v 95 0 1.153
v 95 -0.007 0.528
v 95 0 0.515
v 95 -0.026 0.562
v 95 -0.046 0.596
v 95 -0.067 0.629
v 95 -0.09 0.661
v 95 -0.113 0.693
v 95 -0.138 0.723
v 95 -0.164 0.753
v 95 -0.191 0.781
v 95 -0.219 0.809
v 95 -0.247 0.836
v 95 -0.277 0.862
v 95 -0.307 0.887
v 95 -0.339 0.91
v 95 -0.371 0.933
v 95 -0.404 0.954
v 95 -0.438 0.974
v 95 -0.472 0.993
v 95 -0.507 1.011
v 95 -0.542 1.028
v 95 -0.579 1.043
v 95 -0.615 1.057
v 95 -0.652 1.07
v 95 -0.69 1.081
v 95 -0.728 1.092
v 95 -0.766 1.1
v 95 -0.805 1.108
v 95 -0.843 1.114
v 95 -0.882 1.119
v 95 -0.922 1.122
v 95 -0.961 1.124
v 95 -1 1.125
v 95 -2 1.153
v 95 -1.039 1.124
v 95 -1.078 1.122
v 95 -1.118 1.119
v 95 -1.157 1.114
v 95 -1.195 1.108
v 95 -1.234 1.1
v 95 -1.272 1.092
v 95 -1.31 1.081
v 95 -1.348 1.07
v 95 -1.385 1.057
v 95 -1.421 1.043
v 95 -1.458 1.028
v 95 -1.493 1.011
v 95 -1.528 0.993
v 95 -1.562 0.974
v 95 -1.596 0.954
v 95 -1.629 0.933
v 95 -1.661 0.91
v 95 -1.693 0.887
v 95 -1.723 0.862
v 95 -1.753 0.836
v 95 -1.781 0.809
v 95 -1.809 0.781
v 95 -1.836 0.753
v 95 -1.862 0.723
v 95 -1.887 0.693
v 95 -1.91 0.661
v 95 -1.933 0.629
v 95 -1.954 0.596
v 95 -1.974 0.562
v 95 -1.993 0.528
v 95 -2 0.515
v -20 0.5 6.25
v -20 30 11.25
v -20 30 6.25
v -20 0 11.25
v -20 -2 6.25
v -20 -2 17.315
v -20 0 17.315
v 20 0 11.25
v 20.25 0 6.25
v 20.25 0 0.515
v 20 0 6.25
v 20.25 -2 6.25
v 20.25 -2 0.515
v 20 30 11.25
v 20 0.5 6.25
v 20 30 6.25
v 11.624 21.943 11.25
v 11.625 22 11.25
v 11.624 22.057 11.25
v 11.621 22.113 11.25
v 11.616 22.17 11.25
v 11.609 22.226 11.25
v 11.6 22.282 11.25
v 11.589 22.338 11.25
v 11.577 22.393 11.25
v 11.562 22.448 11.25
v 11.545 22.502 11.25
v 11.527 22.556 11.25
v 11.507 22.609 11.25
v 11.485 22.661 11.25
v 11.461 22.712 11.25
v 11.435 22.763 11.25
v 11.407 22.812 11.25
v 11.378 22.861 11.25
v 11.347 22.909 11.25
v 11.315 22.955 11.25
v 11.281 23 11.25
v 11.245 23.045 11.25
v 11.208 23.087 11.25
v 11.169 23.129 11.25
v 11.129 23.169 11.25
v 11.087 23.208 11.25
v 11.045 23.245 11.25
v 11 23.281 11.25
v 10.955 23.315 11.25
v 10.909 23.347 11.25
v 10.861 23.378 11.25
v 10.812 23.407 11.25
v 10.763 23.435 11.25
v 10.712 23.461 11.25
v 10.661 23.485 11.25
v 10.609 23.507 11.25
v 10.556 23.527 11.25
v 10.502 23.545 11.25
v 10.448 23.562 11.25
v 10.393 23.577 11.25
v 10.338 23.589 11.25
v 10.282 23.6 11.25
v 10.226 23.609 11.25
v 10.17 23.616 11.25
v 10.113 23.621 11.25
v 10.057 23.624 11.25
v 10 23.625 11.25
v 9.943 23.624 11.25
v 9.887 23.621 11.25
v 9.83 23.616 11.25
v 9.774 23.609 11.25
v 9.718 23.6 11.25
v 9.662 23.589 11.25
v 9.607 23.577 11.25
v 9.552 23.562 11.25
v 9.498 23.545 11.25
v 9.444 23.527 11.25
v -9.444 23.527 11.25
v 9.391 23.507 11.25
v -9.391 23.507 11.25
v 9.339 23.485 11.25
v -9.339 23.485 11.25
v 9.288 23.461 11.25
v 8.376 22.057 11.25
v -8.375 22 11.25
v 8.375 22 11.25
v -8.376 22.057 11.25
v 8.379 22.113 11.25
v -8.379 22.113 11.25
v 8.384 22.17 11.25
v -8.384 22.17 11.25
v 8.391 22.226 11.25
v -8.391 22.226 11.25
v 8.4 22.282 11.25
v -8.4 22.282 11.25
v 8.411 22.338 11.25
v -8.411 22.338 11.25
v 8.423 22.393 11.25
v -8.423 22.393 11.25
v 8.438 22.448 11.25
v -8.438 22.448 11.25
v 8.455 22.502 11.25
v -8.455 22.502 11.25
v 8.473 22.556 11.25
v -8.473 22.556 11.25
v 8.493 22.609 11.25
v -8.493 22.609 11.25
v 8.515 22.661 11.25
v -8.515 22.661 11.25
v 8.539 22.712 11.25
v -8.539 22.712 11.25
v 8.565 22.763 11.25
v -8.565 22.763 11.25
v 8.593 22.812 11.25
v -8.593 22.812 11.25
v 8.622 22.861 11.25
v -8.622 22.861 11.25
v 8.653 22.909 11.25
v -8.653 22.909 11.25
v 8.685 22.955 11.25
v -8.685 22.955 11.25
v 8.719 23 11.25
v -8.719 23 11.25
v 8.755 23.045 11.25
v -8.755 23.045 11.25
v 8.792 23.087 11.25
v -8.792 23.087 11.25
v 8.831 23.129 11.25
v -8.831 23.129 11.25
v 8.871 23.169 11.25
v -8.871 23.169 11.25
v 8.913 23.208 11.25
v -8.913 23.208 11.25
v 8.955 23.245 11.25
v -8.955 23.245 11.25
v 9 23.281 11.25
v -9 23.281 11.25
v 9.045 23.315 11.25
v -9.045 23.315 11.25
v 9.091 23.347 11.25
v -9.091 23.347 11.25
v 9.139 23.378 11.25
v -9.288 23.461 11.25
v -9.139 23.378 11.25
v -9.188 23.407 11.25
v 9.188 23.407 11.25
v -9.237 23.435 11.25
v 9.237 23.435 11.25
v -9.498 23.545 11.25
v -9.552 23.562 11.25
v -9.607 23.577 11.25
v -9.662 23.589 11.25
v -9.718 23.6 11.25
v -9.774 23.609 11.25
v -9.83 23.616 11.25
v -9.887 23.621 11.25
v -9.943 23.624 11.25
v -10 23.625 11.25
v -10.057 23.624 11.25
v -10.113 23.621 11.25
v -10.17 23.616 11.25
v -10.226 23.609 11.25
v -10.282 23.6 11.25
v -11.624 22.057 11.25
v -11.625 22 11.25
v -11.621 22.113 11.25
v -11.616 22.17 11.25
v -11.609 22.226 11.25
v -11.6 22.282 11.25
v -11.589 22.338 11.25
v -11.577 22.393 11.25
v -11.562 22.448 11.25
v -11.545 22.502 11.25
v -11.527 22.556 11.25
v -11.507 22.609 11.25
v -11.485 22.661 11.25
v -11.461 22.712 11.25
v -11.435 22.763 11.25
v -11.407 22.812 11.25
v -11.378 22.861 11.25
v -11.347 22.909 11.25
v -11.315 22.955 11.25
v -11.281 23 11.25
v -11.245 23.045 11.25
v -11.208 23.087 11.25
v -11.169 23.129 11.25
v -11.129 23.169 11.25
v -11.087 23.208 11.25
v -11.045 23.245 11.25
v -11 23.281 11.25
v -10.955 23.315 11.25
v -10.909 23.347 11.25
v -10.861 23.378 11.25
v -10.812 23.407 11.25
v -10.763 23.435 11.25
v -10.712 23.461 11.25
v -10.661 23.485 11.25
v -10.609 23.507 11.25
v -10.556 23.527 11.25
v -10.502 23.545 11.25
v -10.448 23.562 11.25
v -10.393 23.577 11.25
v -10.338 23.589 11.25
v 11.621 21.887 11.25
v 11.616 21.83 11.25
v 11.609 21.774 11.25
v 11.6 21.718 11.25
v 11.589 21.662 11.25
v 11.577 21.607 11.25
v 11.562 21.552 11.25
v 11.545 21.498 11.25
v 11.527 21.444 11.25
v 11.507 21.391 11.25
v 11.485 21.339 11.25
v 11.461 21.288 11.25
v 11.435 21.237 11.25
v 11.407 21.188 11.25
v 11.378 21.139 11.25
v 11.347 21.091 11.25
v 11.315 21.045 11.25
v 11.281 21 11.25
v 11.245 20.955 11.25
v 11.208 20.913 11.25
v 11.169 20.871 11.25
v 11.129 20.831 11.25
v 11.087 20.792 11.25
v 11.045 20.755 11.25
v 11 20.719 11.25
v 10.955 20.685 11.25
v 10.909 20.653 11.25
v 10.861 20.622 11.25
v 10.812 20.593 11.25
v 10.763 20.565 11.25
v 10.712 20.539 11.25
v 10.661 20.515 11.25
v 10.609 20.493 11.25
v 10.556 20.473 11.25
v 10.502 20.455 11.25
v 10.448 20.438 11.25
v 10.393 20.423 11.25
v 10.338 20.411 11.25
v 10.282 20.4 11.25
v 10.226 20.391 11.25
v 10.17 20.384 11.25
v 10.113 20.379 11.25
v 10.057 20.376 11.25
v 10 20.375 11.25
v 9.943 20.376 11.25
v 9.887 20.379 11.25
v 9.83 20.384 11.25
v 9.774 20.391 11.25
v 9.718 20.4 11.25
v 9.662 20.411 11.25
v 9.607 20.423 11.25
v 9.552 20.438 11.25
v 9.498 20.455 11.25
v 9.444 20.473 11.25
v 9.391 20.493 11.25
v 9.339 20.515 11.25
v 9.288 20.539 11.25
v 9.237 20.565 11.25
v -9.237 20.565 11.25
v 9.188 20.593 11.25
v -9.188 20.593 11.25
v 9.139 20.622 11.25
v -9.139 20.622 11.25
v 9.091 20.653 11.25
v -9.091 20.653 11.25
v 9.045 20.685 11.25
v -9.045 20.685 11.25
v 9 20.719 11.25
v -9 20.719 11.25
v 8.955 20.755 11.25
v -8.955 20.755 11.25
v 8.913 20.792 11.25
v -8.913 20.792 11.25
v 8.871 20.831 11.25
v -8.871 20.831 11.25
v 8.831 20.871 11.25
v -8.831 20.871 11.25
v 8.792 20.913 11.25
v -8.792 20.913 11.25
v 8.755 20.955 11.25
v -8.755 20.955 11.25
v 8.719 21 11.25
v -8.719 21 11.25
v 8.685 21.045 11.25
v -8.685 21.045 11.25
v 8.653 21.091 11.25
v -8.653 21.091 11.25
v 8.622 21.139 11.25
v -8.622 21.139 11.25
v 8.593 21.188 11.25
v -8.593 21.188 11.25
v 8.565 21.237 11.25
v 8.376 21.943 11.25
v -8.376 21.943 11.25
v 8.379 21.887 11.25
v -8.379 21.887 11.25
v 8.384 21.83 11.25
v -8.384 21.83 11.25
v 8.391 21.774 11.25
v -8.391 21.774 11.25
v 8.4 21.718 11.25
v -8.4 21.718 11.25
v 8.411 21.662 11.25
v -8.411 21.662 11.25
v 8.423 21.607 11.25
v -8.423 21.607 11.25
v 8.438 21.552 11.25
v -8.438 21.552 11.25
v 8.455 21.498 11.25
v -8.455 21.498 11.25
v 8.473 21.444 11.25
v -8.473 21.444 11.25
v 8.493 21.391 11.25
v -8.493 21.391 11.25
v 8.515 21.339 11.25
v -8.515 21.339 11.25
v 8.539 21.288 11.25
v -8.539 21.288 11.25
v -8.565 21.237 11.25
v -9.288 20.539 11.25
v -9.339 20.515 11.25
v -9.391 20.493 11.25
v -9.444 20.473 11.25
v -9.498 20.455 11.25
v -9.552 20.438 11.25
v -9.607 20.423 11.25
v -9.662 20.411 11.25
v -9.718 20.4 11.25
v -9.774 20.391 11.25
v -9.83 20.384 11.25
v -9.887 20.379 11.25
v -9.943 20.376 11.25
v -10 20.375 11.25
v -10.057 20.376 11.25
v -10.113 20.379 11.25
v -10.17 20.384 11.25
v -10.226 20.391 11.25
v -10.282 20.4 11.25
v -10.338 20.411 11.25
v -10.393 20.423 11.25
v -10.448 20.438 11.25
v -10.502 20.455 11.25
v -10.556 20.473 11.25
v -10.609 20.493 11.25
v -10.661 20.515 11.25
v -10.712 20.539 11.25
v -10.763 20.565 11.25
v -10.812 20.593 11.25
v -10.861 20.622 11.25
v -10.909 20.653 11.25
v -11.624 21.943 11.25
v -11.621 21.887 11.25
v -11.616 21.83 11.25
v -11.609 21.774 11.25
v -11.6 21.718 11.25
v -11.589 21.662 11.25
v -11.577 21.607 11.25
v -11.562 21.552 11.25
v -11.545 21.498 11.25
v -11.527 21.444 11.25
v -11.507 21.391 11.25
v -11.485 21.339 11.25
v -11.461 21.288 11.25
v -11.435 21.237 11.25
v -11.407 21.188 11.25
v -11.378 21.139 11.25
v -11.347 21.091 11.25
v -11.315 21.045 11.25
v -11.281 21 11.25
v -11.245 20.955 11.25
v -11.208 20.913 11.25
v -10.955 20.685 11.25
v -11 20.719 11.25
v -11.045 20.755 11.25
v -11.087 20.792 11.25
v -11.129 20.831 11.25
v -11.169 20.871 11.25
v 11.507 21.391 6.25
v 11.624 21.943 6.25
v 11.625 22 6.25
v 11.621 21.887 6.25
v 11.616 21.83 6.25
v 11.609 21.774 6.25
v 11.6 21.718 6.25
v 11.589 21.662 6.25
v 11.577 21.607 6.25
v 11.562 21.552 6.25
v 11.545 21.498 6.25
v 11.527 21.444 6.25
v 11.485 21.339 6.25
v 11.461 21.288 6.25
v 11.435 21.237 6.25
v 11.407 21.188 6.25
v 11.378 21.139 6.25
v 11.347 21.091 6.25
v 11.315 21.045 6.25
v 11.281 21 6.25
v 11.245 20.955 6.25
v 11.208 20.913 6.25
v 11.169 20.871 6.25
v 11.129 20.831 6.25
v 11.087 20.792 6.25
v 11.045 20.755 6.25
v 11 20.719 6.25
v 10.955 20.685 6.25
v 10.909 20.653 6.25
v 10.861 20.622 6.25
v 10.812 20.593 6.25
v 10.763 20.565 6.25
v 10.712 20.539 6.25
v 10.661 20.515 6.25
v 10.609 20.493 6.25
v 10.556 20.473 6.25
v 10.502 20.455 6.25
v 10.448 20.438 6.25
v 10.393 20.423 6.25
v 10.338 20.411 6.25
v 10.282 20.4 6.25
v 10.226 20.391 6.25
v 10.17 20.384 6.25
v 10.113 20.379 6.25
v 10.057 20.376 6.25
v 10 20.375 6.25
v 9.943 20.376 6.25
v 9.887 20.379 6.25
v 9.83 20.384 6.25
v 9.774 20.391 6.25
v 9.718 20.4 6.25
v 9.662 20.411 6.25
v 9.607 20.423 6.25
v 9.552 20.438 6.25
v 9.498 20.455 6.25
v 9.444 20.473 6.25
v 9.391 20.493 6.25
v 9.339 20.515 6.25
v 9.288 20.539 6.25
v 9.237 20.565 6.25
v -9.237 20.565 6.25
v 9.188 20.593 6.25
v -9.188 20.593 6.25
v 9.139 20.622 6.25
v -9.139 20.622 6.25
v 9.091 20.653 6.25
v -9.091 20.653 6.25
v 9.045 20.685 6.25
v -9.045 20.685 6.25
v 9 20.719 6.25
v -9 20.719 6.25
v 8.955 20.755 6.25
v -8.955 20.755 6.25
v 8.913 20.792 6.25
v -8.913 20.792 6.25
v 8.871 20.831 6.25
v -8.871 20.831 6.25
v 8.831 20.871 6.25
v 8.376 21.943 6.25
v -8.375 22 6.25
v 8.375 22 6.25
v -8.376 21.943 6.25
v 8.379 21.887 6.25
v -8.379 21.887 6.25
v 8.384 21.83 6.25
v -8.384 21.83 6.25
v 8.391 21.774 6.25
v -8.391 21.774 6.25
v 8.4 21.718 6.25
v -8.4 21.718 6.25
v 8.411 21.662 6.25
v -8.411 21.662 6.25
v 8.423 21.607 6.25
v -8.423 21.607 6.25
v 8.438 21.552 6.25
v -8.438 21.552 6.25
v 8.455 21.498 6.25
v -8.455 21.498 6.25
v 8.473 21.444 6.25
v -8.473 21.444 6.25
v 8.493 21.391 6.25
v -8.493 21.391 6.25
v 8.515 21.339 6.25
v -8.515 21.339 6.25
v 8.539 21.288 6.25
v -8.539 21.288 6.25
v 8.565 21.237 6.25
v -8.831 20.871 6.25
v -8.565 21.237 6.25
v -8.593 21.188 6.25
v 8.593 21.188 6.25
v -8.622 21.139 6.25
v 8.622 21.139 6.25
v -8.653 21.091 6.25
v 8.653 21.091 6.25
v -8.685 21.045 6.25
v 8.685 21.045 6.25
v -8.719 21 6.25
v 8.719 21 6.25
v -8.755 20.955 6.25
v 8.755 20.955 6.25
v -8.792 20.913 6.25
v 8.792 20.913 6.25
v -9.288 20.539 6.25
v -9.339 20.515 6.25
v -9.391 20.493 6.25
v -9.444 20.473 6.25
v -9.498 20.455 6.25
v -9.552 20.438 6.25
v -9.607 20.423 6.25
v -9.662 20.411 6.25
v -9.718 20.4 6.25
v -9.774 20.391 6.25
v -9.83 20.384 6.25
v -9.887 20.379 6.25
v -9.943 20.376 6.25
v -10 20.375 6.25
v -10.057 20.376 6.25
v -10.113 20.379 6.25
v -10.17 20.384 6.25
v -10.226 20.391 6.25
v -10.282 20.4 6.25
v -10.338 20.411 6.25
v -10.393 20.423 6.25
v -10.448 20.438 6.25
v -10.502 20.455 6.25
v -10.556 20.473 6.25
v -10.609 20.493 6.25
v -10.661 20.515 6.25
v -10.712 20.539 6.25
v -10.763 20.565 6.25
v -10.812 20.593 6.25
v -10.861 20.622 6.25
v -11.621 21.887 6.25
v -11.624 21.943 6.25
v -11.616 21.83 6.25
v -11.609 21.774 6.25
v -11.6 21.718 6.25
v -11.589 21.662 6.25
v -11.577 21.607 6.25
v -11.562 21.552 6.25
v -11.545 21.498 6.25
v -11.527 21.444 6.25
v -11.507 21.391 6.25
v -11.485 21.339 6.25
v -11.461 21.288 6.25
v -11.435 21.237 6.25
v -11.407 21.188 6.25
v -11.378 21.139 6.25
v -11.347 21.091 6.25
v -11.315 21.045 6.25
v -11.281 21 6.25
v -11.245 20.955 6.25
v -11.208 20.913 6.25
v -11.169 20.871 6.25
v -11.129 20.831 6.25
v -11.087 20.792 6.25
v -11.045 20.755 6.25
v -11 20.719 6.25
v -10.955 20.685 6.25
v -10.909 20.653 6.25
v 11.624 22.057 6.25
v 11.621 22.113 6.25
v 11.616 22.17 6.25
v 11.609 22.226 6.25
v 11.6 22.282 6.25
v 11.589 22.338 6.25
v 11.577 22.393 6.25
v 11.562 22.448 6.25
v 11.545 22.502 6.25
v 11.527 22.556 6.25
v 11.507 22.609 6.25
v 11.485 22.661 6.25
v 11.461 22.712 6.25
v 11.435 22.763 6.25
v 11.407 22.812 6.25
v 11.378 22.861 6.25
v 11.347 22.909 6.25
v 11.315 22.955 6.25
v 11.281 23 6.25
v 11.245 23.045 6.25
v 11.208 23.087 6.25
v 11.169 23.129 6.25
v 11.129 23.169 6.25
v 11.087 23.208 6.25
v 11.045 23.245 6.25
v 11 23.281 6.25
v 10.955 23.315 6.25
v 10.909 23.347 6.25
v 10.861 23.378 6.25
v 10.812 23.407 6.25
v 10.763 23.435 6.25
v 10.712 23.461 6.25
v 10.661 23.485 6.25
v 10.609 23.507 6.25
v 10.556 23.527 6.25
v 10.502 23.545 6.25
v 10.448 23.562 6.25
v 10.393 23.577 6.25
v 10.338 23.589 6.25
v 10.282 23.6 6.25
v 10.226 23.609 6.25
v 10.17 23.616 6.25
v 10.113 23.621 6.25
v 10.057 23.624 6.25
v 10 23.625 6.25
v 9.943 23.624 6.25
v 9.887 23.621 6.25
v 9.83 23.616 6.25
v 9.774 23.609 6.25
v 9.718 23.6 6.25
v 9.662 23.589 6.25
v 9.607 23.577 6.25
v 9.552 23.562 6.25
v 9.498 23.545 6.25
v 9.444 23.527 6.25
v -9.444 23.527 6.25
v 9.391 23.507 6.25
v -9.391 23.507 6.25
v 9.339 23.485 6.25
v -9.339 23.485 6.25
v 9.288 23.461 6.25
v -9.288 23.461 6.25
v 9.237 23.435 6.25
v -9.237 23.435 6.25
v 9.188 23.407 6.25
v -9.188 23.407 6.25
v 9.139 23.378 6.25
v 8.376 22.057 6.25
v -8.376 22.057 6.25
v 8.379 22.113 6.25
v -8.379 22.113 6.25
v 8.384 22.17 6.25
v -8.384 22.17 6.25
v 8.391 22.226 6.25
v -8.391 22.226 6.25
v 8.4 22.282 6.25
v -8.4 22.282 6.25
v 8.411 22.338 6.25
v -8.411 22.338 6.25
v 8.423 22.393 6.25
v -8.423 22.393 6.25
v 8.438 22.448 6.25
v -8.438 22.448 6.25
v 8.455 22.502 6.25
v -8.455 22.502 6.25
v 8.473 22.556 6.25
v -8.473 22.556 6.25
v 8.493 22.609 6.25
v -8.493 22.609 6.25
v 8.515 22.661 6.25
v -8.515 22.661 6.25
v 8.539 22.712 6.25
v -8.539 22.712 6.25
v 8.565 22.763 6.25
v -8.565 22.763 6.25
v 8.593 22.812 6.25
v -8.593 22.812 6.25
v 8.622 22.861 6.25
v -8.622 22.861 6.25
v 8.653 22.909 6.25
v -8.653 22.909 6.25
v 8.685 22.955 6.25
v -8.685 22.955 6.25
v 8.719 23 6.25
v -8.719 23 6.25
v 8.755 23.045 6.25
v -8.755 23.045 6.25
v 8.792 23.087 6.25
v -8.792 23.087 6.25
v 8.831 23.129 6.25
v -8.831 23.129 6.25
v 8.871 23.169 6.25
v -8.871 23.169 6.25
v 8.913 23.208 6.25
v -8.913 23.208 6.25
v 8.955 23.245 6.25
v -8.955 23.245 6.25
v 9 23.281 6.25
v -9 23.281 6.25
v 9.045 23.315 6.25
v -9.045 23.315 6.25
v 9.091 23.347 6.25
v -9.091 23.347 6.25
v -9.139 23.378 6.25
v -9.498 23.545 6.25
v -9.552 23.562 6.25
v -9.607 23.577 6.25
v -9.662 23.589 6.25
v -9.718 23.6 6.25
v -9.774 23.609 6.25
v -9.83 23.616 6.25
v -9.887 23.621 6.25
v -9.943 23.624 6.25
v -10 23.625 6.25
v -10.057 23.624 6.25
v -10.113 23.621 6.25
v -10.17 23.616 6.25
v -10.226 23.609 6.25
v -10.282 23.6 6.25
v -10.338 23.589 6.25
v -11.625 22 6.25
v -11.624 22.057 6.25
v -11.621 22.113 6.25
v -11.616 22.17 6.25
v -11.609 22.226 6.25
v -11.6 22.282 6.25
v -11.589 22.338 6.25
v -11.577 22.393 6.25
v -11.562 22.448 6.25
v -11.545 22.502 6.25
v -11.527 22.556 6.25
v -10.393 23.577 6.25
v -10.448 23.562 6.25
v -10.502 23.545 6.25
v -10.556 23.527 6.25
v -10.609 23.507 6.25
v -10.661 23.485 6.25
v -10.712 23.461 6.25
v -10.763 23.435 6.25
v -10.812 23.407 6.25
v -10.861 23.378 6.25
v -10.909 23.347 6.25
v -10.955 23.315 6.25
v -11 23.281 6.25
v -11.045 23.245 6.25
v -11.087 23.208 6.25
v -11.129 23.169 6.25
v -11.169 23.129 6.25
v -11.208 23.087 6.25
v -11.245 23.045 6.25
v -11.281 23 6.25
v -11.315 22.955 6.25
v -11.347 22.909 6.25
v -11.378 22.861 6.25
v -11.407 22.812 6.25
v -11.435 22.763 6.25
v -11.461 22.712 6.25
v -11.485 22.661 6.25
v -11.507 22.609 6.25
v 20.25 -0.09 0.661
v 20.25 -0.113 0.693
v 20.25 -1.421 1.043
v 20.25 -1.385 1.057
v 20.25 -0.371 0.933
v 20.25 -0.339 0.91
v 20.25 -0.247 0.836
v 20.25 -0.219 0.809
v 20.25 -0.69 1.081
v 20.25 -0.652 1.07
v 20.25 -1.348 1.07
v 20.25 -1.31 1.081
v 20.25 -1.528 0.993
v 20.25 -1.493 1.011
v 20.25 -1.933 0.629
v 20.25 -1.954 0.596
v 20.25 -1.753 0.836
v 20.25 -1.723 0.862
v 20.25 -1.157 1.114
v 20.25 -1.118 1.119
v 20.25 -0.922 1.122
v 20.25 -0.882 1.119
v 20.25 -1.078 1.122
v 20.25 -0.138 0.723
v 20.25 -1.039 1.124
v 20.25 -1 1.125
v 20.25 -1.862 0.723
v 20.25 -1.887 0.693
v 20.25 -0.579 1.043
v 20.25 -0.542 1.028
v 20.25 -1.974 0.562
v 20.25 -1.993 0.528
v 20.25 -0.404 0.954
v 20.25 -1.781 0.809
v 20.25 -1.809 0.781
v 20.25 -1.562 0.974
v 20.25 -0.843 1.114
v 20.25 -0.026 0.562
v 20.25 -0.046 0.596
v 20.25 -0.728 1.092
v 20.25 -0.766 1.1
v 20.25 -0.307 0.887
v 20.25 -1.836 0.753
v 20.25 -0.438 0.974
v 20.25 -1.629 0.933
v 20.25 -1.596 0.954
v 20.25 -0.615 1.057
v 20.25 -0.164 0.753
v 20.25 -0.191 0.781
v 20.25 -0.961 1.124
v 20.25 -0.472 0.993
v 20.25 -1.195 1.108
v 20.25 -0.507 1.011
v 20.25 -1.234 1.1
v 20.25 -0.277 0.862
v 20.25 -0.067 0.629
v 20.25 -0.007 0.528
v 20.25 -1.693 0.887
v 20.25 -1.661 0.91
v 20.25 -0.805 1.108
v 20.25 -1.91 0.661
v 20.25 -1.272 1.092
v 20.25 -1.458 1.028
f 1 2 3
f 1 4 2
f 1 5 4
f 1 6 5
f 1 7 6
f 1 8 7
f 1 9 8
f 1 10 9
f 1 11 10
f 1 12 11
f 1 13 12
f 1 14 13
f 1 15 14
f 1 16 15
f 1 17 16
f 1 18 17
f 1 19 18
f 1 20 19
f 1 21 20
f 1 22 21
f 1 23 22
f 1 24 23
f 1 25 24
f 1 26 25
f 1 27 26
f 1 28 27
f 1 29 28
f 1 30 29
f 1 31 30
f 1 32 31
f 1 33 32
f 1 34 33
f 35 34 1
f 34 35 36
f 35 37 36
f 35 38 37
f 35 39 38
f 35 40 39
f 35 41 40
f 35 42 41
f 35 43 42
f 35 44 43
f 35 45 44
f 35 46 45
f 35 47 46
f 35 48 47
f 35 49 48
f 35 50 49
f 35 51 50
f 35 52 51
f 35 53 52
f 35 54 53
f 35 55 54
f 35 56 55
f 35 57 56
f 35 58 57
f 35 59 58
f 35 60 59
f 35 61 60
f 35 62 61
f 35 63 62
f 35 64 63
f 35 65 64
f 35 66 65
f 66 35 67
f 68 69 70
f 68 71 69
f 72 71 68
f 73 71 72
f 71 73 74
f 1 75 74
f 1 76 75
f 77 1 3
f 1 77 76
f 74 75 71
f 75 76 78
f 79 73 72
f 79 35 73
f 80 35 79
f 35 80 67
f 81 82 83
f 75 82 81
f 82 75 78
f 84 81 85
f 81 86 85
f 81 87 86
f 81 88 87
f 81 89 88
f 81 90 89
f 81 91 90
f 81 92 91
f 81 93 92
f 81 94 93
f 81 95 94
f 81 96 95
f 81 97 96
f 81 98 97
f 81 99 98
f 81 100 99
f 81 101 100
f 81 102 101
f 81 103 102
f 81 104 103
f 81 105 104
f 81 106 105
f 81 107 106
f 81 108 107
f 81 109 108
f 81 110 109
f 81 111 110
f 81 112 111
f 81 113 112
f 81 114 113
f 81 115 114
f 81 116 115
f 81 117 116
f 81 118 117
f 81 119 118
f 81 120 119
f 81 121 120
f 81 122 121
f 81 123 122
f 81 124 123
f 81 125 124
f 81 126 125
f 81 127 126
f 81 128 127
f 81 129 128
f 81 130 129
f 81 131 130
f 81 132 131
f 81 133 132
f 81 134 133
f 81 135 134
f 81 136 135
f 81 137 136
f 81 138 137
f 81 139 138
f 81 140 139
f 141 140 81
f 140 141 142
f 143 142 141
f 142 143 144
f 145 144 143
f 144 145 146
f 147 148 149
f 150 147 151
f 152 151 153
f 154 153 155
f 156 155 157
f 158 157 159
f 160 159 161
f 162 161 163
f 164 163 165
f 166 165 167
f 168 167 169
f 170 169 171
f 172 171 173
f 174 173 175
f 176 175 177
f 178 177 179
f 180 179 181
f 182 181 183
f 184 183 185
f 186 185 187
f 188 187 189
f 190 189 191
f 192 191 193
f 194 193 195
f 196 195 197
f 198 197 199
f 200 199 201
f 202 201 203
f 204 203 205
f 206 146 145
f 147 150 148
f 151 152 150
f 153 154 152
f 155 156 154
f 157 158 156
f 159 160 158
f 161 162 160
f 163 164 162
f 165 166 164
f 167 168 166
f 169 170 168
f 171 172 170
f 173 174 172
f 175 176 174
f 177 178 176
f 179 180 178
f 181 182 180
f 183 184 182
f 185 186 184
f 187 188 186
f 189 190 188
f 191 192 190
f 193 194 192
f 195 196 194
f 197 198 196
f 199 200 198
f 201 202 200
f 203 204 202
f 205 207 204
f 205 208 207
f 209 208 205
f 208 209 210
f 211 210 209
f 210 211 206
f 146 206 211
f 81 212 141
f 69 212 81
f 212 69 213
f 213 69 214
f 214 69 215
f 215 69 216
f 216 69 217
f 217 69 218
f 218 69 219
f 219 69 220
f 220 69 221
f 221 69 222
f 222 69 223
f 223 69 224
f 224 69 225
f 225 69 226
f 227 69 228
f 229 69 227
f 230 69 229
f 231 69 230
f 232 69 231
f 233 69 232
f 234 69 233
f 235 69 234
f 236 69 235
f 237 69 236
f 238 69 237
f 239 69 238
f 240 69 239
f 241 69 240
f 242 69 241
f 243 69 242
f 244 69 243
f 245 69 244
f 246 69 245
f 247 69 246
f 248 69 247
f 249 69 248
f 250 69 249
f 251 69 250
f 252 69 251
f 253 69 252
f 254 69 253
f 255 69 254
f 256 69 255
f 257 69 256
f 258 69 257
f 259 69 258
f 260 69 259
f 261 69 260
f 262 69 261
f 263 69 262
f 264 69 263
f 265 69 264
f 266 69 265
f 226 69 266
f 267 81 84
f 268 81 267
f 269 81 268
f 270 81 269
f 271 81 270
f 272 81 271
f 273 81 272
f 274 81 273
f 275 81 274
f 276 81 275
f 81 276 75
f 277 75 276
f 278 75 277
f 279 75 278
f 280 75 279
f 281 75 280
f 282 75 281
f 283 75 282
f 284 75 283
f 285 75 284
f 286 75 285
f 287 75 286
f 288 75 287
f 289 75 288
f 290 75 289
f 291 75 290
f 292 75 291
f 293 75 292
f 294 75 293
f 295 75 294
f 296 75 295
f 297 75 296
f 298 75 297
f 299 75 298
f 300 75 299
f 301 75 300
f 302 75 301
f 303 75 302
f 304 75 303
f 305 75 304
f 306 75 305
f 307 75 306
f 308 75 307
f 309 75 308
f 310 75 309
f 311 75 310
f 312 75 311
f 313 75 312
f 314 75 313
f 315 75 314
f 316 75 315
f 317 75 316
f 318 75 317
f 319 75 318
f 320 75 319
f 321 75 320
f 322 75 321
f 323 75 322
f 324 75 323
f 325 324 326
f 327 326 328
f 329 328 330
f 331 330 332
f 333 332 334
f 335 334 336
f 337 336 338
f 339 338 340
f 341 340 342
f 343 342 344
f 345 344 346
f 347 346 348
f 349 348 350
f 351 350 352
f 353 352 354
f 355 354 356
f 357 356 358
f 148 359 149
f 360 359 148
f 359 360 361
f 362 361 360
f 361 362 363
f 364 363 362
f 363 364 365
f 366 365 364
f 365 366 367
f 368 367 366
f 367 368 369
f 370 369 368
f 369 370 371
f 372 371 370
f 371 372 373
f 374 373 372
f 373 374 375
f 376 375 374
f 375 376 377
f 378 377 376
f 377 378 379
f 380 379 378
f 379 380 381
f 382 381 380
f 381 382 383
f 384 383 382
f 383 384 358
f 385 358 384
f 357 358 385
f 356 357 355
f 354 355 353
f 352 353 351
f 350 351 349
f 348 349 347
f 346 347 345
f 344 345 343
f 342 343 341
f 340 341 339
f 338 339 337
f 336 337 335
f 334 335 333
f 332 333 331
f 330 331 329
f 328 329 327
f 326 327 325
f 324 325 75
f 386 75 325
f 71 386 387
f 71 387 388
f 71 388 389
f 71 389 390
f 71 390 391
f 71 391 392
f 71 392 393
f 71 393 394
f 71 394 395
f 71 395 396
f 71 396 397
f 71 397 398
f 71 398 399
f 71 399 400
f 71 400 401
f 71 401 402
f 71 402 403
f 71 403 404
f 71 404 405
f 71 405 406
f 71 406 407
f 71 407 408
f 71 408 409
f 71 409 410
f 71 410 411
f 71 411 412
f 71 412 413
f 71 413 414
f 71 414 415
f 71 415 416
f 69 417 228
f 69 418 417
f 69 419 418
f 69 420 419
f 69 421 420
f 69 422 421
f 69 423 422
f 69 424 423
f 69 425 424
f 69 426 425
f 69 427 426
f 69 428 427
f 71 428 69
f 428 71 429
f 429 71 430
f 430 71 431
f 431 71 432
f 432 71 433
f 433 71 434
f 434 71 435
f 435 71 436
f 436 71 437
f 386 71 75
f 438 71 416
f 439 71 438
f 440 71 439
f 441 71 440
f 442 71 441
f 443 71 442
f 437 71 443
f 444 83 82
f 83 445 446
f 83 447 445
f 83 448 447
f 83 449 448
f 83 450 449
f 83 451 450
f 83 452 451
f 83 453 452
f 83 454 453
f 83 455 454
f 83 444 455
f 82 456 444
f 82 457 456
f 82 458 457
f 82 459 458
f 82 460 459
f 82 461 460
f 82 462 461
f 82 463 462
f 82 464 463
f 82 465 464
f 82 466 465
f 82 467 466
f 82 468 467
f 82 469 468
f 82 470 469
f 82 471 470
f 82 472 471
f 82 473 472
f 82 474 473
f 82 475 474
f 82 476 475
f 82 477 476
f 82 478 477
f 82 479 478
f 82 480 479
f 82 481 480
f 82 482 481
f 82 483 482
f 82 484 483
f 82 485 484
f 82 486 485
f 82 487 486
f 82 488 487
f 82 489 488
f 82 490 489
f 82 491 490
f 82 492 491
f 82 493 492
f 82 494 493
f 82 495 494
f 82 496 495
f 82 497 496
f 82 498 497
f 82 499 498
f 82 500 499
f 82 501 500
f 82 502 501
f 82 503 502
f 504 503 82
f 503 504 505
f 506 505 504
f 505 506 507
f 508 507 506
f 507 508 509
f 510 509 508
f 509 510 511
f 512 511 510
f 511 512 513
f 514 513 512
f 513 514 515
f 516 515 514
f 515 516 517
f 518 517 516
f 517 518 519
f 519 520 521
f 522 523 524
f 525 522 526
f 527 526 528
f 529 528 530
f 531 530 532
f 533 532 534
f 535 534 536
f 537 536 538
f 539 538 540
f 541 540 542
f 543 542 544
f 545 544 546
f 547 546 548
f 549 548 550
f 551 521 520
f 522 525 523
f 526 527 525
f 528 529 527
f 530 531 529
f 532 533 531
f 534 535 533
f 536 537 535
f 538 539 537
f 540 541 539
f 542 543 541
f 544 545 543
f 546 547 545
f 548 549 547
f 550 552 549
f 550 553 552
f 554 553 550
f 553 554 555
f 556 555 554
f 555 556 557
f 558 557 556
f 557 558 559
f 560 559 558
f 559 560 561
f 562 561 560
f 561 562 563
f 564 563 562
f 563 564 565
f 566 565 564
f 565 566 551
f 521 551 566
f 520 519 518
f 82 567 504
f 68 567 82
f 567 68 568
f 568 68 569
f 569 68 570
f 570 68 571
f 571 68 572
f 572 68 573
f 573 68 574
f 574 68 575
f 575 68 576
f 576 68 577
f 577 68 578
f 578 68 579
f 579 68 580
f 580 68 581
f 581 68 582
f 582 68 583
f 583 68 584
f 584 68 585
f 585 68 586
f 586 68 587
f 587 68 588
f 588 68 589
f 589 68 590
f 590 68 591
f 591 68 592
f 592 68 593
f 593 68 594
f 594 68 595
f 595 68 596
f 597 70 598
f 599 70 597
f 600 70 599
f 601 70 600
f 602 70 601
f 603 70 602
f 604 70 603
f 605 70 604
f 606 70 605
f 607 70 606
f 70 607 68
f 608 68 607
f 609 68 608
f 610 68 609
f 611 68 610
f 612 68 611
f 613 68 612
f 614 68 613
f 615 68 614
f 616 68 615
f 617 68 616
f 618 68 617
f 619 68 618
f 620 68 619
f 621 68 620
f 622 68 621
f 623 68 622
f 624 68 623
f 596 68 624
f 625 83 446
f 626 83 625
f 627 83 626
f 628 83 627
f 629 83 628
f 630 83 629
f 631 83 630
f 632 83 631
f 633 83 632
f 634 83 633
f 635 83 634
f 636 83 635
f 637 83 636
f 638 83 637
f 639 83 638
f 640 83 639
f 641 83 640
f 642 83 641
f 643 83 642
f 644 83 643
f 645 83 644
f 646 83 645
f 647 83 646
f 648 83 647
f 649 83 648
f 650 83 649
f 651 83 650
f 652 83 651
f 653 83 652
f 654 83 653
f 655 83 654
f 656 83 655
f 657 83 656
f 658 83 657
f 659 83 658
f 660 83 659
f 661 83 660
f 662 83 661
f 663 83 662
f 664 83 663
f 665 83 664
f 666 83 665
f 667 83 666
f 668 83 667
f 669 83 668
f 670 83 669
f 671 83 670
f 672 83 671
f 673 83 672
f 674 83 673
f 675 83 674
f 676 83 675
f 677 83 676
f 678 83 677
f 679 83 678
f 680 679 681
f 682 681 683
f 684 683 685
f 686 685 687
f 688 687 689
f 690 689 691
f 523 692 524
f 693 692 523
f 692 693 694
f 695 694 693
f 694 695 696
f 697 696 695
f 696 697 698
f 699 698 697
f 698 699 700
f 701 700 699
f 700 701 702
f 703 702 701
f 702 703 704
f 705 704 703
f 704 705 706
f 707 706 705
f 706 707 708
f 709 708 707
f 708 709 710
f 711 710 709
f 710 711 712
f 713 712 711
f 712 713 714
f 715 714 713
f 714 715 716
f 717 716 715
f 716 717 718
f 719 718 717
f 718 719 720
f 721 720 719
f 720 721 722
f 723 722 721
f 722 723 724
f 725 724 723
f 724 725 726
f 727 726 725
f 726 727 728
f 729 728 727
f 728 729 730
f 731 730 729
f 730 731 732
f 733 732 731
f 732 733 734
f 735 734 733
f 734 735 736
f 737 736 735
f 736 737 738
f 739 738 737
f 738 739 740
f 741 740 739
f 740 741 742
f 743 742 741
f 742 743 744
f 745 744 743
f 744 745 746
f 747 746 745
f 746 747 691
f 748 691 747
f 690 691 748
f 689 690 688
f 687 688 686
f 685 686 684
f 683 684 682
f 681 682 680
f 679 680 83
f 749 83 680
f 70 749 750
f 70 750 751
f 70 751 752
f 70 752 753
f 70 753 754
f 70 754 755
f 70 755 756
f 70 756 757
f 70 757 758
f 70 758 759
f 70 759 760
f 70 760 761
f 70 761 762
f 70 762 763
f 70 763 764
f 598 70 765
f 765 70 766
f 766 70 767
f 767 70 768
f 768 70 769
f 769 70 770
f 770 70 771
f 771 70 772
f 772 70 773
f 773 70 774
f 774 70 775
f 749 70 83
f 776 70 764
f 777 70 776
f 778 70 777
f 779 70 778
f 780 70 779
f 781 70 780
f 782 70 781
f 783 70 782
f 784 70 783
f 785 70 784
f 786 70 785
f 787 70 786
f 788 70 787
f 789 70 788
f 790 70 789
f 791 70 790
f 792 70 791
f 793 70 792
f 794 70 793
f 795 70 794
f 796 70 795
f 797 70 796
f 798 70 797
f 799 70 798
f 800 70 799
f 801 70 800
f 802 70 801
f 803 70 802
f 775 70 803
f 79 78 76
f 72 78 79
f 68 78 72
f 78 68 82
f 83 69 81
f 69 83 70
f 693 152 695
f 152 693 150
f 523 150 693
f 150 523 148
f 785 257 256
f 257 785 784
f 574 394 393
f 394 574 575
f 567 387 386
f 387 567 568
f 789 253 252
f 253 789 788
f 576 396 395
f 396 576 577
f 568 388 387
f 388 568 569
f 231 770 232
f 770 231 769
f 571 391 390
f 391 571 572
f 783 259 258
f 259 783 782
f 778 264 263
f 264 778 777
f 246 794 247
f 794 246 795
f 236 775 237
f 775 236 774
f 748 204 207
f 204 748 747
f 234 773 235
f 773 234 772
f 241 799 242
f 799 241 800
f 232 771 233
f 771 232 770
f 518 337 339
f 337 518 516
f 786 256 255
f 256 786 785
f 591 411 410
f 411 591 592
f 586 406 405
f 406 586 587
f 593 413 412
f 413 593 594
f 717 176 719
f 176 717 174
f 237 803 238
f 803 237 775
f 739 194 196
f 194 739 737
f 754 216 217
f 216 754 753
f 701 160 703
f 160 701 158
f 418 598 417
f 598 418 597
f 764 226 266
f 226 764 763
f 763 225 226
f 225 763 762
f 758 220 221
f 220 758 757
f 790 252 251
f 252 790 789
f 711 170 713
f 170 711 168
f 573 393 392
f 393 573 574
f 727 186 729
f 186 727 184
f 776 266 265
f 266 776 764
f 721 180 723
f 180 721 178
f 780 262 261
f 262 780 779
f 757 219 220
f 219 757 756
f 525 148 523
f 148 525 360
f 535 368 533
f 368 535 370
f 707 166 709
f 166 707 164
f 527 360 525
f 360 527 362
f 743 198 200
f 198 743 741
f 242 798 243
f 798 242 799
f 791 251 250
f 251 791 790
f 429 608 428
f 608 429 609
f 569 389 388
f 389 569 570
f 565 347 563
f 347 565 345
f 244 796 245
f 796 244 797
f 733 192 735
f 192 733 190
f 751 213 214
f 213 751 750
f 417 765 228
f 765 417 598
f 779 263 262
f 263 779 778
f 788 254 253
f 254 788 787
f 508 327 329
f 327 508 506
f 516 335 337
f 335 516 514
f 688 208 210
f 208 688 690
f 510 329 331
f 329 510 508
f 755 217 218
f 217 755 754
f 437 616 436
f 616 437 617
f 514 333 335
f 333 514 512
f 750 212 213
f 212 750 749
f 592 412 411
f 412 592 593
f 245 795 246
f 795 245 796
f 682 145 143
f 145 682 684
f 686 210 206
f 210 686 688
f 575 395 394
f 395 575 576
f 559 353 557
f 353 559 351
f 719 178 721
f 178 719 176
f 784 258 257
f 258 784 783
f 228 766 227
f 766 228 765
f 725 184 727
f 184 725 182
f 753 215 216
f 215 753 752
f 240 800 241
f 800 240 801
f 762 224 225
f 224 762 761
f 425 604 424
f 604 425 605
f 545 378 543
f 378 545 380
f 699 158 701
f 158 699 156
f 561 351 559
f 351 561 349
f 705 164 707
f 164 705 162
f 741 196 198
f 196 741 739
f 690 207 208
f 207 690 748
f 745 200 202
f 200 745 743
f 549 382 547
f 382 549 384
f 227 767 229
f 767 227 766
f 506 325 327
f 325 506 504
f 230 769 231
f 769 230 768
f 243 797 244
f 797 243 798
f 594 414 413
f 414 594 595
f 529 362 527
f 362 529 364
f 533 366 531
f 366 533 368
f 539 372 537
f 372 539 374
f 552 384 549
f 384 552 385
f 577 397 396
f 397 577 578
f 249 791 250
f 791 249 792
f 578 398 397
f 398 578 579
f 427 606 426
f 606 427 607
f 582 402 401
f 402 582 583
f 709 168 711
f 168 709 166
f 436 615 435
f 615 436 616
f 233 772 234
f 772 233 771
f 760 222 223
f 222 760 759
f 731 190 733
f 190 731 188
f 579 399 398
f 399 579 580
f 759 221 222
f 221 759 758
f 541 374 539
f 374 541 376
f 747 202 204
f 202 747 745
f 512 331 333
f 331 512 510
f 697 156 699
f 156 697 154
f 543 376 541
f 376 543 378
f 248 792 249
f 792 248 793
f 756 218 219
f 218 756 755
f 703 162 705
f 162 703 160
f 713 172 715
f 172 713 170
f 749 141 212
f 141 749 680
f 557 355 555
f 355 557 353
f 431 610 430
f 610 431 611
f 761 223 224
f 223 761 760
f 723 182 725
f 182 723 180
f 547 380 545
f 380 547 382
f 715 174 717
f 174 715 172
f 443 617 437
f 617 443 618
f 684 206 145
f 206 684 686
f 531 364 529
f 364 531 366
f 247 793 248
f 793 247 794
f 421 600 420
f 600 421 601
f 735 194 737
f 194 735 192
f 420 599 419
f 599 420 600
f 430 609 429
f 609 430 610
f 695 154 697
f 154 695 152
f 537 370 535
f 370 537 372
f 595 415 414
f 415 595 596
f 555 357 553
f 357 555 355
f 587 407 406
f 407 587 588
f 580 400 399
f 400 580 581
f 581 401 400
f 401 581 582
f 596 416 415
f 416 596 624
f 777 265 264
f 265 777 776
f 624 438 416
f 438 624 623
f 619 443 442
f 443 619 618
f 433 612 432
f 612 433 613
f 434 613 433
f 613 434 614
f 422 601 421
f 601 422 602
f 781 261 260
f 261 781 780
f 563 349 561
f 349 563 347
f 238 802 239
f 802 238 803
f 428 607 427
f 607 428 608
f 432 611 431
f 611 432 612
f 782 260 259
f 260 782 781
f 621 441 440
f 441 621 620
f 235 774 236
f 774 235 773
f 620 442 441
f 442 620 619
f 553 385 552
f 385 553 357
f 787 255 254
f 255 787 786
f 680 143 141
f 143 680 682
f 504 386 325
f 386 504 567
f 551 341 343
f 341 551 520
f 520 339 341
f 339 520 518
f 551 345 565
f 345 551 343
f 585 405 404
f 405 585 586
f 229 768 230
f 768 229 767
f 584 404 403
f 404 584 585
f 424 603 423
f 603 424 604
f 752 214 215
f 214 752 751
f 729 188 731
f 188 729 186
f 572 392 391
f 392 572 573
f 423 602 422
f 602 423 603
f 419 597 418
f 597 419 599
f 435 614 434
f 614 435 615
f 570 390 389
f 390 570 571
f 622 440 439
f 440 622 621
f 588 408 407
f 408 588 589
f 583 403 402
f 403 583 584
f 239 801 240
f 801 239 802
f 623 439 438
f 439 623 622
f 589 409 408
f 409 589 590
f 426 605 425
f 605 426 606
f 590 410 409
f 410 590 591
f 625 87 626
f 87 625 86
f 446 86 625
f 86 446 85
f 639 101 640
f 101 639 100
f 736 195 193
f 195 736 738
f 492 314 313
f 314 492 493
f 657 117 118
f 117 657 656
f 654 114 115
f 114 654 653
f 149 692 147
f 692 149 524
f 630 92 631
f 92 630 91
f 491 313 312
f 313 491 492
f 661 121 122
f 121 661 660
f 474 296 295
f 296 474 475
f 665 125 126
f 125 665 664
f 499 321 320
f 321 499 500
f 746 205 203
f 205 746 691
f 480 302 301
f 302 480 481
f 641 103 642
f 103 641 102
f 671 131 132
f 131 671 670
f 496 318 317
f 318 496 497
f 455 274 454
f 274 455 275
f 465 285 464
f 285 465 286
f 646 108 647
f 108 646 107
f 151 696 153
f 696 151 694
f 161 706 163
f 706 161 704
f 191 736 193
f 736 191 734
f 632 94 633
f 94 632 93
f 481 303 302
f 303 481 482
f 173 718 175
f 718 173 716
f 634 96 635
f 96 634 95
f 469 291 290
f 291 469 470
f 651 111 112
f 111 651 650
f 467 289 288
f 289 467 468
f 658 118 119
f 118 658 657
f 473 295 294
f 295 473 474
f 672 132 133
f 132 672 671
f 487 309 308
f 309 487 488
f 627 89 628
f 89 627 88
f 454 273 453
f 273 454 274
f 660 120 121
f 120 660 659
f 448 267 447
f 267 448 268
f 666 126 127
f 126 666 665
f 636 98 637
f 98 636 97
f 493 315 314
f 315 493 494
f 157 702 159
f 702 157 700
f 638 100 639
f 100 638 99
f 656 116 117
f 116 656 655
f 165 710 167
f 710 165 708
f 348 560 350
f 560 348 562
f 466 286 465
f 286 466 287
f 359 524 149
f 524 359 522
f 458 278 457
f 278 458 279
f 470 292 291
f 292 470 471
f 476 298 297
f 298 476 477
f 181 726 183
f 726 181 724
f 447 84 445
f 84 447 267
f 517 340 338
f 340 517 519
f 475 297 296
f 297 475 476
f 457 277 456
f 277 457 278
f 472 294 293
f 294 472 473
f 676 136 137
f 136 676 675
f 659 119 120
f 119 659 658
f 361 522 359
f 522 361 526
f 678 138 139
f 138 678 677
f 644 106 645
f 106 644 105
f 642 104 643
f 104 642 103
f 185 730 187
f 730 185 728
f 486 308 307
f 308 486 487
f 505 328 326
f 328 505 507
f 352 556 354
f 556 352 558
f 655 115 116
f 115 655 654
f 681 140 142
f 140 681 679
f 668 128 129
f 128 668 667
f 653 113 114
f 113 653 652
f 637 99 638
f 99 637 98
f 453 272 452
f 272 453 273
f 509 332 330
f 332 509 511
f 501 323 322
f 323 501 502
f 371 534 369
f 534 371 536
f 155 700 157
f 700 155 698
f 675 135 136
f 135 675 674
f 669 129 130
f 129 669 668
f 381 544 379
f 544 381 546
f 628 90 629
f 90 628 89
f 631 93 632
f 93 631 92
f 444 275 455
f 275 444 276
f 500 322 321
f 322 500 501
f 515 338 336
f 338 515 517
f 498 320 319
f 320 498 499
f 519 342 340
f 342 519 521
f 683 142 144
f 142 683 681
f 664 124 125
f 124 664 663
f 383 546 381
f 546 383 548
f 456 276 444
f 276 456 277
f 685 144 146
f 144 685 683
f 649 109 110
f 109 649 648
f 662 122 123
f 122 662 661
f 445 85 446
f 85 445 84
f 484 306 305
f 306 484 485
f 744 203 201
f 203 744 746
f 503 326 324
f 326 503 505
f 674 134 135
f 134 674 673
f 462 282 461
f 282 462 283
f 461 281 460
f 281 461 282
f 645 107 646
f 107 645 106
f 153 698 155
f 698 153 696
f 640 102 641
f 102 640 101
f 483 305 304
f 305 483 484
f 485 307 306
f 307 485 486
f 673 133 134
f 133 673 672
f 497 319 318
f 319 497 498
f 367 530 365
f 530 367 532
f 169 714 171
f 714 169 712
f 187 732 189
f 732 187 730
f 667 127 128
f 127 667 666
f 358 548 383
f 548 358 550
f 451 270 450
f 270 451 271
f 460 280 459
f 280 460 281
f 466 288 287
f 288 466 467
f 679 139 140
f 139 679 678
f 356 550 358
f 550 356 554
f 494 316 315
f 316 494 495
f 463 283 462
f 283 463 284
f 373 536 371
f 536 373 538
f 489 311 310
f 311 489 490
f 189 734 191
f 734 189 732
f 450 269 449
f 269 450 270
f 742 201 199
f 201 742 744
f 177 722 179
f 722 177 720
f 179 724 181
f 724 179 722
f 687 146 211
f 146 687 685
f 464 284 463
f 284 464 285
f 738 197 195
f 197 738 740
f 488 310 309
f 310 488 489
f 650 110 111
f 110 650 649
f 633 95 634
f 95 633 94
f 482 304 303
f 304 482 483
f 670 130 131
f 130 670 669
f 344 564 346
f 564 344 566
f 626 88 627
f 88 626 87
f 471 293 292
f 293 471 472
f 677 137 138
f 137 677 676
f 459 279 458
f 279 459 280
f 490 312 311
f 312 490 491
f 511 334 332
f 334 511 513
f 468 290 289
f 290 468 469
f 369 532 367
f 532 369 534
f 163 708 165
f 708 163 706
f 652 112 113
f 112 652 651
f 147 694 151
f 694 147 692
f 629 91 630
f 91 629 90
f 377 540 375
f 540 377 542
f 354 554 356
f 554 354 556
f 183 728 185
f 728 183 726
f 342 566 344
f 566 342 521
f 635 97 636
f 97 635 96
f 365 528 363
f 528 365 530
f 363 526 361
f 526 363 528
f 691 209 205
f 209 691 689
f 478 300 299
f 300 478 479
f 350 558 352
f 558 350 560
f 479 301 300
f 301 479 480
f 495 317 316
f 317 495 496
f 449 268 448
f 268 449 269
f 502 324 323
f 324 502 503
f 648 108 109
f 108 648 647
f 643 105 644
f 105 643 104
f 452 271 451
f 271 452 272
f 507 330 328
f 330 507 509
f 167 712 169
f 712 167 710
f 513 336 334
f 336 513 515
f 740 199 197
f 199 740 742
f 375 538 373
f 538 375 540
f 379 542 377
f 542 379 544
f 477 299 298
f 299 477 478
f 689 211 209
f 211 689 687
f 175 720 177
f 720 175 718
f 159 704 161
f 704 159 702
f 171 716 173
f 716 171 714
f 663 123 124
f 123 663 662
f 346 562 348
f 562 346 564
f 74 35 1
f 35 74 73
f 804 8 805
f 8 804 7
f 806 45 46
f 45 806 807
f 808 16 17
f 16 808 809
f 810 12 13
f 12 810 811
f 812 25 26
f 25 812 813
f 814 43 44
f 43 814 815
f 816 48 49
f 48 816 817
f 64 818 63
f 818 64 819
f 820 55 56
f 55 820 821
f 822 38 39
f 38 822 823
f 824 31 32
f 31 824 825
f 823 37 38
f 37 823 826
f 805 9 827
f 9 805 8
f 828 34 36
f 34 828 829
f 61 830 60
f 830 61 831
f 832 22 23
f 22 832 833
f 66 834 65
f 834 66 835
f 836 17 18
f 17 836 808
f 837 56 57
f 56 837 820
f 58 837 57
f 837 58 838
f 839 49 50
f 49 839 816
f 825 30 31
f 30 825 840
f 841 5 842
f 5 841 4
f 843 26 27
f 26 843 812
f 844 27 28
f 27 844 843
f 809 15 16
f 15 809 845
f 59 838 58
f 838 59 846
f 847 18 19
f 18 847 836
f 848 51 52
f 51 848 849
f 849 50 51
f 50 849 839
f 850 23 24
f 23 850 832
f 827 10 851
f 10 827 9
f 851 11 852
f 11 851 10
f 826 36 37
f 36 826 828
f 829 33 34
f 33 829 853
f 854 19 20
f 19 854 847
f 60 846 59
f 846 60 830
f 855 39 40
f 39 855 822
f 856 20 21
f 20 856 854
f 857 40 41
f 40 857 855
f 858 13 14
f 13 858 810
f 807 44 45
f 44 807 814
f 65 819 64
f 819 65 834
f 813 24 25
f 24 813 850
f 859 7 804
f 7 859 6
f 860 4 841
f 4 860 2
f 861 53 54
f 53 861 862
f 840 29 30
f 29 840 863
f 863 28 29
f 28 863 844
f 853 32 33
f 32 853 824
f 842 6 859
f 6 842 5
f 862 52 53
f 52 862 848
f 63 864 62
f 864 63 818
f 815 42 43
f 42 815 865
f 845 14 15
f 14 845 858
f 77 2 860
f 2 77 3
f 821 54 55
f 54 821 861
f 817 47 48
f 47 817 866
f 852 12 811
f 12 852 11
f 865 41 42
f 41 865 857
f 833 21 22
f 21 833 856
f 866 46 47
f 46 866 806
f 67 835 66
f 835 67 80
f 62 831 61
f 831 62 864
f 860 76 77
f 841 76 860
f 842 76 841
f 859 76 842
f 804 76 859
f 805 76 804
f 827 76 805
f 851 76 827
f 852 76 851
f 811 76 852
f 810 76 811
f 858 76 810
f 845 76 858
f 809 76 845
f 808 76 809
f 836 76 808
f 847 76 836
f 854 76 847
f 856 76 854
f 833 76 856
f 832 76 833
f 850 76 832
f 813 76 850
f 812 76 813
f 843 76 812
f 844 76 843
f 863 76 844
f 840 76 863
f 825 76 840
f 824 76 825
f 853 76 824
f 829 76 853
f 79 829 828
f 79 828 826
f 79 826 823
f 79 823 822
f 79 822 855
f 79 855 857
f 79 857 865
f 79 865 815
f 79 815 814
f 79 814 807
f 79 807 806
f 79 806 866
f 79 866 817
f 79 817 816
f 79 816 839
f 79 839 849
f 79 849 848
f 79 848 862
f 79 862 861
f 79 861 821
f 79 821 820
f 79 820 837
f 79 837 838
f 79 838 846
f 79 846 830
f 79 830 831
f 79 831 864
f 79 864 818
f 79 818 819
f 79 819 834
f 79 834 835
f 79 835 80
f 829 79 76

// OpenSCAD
//cube([120,120,3], center = true);
//translate([-45,-45,0])cylinder(h = 3, r=15, $fn = 180, center = true);
//rotate_extrude(convexity = 10, $fn = A) translate([20+1.5, 0, 0])circle(d = 3, $fn = B);


finTop();
//finBottom();
//PypeGuide();


module PypeGuide(){
difference(){
    
union(){    
translate([0,9,0])cube([40,60-18,12], center = true);
    
translate([-40,25,0])cube([40,10,12], center = true); 
 
translate([-50,25,0])rotate([90,0,0])cylinder(h = 10, d=30+29, $fn = 180, center = true);  
  
//weight wheel    
    
translate([-95,25,-19])rotate([90,0,0])cylinder(h = 10, d=38, $fn = 180, center = true);  


translate([(-95-50)/2,25,-19/2])rotate([0,67.1,0])cube([38,10,48], center = true);    

}  


//m3 holes to connect fins
for(i=[-1,1])translate([i*10,22,0])rotate([0,0,0])cylinder(h = 50, d=3.25, $fn = 180, center = true); 


 translate([-50,25,0])rotate([90,0,0])cylinder(h = 11, d=5.25, $fn = 180, center = true);   

for(i=[-1,1])translate([-50+i*12,25,0])rotate([90,0,0])cylinder(h = 11, d=5, $fn = 180, center = true); 
 
    
translate([0.5,-15+13+1,0])rotate([0,90,0])cylinder(h = 40, d=2.25, $fn = 180, center = true);    

translate([0,-15+13+1,0])rotate([0,90,0])cylinder(h = 60, d=2, $fn = 180, center = true);  
    
translate([0,-25+13,0])cube([70,40+5,1.25], center = true);  
   
   
//m3 nuts 
    
for(i=[0,1])mirror([i,0,0])translate([10,-25+18,3.5+3])rotate([0,0,30]) cylinder(h = 6, d=7, $fn = 6, center = true);    
    

for(i=[0,1])mirror([i,0,0])translate([10,-25+18,-3.5-3])cylinder(h = 6, d=6, $fn = 30, center = true); 
    
for(i=[0,1])mirror([i,0,0])translate([10,-25+18,0])cylinder(h = 20, d=3.25, $fn = 30, center = true); 


//hole for weights
translate([-95,25,-19])rotate([90,0,0])cylinder(h = 11, d=8.25, $fn = 180, center = true); 

}   
}







module finBottom(){

difference(){
    
union(){    
translate([75/2,-15+13+1,-25/2])cube([40+75,2,25], center = true);   
    
    
//Plate for m3 skrews
translate([0,15,-8.5-0.25])cube([40,30,5], center = true);    


//bottom supports
difference(){ 
for(i=[-1:1])translate([i*17.5,15,-15])cube([5,30,20], center = true); 

translate([15,25,-30.05])rotate([24.5,0,0])cube([80,50,30], center = true); 


translate([0,15,-8.5-0.25+5])cube([40,30,5], center = true);  
}    
}


//m3 holes to connect fins
for(i=[-1,1])translate([i*10,22,0])rotate([0,0,0])cylinder(h = 50, d=3.25, $fn = 180, center = true); 
    
//m3 holes to connect fins
for(i=[-1,1])translate([i*10,22,-9.5-0.25])rotate([0,0,0])cylinder(h = 3, d=6, $fn = 180, center = true); 


//center empying
translate([0,-15+13+1,0])cube([40+0.5,3,12+0.5], center = true); 


//pype hole
translate([50,-15+13+1,0])rotate([0,90,0])cylinder(h = 130, d=2.25, $fn = 180, center = true);  
    
    
    
//top elimination
//translate([75/2,-15+13+1,40])rotate([0,12.9,0])cube([150,3,50], center = true);      
 
}    
}    





module finTop(){
    
    
difference(){ 
 
union(){    
translate([75/2,-15+13+1,25/2])cube([40+75,2,25], center = true);     

//m3 plate
translate([0,15,8.5+0.25])cube([40,30,5], center = true);  

}
    
//top slanting
translate([50,-15+13+1,25/2+7.6])rotate([0,8,0])cube([150,3,25], center = true);  

//pype hole
translate([50,-15+13+1,0])rotate([0,90,0])cylinder(h = 130, d=2.25, $fn = 180, center = true);  

//center empying
translate([0,-15+13+1,0])cube([40+0.5,3,12+0.5], center = true); 


//m3 holes to connect fins
for(i=[-1,1])translate([i*10,22,0])rotate([0,0,0])cylinder(h = 50, d=3.25, $fn = 180, center = true); 

}    
}    
